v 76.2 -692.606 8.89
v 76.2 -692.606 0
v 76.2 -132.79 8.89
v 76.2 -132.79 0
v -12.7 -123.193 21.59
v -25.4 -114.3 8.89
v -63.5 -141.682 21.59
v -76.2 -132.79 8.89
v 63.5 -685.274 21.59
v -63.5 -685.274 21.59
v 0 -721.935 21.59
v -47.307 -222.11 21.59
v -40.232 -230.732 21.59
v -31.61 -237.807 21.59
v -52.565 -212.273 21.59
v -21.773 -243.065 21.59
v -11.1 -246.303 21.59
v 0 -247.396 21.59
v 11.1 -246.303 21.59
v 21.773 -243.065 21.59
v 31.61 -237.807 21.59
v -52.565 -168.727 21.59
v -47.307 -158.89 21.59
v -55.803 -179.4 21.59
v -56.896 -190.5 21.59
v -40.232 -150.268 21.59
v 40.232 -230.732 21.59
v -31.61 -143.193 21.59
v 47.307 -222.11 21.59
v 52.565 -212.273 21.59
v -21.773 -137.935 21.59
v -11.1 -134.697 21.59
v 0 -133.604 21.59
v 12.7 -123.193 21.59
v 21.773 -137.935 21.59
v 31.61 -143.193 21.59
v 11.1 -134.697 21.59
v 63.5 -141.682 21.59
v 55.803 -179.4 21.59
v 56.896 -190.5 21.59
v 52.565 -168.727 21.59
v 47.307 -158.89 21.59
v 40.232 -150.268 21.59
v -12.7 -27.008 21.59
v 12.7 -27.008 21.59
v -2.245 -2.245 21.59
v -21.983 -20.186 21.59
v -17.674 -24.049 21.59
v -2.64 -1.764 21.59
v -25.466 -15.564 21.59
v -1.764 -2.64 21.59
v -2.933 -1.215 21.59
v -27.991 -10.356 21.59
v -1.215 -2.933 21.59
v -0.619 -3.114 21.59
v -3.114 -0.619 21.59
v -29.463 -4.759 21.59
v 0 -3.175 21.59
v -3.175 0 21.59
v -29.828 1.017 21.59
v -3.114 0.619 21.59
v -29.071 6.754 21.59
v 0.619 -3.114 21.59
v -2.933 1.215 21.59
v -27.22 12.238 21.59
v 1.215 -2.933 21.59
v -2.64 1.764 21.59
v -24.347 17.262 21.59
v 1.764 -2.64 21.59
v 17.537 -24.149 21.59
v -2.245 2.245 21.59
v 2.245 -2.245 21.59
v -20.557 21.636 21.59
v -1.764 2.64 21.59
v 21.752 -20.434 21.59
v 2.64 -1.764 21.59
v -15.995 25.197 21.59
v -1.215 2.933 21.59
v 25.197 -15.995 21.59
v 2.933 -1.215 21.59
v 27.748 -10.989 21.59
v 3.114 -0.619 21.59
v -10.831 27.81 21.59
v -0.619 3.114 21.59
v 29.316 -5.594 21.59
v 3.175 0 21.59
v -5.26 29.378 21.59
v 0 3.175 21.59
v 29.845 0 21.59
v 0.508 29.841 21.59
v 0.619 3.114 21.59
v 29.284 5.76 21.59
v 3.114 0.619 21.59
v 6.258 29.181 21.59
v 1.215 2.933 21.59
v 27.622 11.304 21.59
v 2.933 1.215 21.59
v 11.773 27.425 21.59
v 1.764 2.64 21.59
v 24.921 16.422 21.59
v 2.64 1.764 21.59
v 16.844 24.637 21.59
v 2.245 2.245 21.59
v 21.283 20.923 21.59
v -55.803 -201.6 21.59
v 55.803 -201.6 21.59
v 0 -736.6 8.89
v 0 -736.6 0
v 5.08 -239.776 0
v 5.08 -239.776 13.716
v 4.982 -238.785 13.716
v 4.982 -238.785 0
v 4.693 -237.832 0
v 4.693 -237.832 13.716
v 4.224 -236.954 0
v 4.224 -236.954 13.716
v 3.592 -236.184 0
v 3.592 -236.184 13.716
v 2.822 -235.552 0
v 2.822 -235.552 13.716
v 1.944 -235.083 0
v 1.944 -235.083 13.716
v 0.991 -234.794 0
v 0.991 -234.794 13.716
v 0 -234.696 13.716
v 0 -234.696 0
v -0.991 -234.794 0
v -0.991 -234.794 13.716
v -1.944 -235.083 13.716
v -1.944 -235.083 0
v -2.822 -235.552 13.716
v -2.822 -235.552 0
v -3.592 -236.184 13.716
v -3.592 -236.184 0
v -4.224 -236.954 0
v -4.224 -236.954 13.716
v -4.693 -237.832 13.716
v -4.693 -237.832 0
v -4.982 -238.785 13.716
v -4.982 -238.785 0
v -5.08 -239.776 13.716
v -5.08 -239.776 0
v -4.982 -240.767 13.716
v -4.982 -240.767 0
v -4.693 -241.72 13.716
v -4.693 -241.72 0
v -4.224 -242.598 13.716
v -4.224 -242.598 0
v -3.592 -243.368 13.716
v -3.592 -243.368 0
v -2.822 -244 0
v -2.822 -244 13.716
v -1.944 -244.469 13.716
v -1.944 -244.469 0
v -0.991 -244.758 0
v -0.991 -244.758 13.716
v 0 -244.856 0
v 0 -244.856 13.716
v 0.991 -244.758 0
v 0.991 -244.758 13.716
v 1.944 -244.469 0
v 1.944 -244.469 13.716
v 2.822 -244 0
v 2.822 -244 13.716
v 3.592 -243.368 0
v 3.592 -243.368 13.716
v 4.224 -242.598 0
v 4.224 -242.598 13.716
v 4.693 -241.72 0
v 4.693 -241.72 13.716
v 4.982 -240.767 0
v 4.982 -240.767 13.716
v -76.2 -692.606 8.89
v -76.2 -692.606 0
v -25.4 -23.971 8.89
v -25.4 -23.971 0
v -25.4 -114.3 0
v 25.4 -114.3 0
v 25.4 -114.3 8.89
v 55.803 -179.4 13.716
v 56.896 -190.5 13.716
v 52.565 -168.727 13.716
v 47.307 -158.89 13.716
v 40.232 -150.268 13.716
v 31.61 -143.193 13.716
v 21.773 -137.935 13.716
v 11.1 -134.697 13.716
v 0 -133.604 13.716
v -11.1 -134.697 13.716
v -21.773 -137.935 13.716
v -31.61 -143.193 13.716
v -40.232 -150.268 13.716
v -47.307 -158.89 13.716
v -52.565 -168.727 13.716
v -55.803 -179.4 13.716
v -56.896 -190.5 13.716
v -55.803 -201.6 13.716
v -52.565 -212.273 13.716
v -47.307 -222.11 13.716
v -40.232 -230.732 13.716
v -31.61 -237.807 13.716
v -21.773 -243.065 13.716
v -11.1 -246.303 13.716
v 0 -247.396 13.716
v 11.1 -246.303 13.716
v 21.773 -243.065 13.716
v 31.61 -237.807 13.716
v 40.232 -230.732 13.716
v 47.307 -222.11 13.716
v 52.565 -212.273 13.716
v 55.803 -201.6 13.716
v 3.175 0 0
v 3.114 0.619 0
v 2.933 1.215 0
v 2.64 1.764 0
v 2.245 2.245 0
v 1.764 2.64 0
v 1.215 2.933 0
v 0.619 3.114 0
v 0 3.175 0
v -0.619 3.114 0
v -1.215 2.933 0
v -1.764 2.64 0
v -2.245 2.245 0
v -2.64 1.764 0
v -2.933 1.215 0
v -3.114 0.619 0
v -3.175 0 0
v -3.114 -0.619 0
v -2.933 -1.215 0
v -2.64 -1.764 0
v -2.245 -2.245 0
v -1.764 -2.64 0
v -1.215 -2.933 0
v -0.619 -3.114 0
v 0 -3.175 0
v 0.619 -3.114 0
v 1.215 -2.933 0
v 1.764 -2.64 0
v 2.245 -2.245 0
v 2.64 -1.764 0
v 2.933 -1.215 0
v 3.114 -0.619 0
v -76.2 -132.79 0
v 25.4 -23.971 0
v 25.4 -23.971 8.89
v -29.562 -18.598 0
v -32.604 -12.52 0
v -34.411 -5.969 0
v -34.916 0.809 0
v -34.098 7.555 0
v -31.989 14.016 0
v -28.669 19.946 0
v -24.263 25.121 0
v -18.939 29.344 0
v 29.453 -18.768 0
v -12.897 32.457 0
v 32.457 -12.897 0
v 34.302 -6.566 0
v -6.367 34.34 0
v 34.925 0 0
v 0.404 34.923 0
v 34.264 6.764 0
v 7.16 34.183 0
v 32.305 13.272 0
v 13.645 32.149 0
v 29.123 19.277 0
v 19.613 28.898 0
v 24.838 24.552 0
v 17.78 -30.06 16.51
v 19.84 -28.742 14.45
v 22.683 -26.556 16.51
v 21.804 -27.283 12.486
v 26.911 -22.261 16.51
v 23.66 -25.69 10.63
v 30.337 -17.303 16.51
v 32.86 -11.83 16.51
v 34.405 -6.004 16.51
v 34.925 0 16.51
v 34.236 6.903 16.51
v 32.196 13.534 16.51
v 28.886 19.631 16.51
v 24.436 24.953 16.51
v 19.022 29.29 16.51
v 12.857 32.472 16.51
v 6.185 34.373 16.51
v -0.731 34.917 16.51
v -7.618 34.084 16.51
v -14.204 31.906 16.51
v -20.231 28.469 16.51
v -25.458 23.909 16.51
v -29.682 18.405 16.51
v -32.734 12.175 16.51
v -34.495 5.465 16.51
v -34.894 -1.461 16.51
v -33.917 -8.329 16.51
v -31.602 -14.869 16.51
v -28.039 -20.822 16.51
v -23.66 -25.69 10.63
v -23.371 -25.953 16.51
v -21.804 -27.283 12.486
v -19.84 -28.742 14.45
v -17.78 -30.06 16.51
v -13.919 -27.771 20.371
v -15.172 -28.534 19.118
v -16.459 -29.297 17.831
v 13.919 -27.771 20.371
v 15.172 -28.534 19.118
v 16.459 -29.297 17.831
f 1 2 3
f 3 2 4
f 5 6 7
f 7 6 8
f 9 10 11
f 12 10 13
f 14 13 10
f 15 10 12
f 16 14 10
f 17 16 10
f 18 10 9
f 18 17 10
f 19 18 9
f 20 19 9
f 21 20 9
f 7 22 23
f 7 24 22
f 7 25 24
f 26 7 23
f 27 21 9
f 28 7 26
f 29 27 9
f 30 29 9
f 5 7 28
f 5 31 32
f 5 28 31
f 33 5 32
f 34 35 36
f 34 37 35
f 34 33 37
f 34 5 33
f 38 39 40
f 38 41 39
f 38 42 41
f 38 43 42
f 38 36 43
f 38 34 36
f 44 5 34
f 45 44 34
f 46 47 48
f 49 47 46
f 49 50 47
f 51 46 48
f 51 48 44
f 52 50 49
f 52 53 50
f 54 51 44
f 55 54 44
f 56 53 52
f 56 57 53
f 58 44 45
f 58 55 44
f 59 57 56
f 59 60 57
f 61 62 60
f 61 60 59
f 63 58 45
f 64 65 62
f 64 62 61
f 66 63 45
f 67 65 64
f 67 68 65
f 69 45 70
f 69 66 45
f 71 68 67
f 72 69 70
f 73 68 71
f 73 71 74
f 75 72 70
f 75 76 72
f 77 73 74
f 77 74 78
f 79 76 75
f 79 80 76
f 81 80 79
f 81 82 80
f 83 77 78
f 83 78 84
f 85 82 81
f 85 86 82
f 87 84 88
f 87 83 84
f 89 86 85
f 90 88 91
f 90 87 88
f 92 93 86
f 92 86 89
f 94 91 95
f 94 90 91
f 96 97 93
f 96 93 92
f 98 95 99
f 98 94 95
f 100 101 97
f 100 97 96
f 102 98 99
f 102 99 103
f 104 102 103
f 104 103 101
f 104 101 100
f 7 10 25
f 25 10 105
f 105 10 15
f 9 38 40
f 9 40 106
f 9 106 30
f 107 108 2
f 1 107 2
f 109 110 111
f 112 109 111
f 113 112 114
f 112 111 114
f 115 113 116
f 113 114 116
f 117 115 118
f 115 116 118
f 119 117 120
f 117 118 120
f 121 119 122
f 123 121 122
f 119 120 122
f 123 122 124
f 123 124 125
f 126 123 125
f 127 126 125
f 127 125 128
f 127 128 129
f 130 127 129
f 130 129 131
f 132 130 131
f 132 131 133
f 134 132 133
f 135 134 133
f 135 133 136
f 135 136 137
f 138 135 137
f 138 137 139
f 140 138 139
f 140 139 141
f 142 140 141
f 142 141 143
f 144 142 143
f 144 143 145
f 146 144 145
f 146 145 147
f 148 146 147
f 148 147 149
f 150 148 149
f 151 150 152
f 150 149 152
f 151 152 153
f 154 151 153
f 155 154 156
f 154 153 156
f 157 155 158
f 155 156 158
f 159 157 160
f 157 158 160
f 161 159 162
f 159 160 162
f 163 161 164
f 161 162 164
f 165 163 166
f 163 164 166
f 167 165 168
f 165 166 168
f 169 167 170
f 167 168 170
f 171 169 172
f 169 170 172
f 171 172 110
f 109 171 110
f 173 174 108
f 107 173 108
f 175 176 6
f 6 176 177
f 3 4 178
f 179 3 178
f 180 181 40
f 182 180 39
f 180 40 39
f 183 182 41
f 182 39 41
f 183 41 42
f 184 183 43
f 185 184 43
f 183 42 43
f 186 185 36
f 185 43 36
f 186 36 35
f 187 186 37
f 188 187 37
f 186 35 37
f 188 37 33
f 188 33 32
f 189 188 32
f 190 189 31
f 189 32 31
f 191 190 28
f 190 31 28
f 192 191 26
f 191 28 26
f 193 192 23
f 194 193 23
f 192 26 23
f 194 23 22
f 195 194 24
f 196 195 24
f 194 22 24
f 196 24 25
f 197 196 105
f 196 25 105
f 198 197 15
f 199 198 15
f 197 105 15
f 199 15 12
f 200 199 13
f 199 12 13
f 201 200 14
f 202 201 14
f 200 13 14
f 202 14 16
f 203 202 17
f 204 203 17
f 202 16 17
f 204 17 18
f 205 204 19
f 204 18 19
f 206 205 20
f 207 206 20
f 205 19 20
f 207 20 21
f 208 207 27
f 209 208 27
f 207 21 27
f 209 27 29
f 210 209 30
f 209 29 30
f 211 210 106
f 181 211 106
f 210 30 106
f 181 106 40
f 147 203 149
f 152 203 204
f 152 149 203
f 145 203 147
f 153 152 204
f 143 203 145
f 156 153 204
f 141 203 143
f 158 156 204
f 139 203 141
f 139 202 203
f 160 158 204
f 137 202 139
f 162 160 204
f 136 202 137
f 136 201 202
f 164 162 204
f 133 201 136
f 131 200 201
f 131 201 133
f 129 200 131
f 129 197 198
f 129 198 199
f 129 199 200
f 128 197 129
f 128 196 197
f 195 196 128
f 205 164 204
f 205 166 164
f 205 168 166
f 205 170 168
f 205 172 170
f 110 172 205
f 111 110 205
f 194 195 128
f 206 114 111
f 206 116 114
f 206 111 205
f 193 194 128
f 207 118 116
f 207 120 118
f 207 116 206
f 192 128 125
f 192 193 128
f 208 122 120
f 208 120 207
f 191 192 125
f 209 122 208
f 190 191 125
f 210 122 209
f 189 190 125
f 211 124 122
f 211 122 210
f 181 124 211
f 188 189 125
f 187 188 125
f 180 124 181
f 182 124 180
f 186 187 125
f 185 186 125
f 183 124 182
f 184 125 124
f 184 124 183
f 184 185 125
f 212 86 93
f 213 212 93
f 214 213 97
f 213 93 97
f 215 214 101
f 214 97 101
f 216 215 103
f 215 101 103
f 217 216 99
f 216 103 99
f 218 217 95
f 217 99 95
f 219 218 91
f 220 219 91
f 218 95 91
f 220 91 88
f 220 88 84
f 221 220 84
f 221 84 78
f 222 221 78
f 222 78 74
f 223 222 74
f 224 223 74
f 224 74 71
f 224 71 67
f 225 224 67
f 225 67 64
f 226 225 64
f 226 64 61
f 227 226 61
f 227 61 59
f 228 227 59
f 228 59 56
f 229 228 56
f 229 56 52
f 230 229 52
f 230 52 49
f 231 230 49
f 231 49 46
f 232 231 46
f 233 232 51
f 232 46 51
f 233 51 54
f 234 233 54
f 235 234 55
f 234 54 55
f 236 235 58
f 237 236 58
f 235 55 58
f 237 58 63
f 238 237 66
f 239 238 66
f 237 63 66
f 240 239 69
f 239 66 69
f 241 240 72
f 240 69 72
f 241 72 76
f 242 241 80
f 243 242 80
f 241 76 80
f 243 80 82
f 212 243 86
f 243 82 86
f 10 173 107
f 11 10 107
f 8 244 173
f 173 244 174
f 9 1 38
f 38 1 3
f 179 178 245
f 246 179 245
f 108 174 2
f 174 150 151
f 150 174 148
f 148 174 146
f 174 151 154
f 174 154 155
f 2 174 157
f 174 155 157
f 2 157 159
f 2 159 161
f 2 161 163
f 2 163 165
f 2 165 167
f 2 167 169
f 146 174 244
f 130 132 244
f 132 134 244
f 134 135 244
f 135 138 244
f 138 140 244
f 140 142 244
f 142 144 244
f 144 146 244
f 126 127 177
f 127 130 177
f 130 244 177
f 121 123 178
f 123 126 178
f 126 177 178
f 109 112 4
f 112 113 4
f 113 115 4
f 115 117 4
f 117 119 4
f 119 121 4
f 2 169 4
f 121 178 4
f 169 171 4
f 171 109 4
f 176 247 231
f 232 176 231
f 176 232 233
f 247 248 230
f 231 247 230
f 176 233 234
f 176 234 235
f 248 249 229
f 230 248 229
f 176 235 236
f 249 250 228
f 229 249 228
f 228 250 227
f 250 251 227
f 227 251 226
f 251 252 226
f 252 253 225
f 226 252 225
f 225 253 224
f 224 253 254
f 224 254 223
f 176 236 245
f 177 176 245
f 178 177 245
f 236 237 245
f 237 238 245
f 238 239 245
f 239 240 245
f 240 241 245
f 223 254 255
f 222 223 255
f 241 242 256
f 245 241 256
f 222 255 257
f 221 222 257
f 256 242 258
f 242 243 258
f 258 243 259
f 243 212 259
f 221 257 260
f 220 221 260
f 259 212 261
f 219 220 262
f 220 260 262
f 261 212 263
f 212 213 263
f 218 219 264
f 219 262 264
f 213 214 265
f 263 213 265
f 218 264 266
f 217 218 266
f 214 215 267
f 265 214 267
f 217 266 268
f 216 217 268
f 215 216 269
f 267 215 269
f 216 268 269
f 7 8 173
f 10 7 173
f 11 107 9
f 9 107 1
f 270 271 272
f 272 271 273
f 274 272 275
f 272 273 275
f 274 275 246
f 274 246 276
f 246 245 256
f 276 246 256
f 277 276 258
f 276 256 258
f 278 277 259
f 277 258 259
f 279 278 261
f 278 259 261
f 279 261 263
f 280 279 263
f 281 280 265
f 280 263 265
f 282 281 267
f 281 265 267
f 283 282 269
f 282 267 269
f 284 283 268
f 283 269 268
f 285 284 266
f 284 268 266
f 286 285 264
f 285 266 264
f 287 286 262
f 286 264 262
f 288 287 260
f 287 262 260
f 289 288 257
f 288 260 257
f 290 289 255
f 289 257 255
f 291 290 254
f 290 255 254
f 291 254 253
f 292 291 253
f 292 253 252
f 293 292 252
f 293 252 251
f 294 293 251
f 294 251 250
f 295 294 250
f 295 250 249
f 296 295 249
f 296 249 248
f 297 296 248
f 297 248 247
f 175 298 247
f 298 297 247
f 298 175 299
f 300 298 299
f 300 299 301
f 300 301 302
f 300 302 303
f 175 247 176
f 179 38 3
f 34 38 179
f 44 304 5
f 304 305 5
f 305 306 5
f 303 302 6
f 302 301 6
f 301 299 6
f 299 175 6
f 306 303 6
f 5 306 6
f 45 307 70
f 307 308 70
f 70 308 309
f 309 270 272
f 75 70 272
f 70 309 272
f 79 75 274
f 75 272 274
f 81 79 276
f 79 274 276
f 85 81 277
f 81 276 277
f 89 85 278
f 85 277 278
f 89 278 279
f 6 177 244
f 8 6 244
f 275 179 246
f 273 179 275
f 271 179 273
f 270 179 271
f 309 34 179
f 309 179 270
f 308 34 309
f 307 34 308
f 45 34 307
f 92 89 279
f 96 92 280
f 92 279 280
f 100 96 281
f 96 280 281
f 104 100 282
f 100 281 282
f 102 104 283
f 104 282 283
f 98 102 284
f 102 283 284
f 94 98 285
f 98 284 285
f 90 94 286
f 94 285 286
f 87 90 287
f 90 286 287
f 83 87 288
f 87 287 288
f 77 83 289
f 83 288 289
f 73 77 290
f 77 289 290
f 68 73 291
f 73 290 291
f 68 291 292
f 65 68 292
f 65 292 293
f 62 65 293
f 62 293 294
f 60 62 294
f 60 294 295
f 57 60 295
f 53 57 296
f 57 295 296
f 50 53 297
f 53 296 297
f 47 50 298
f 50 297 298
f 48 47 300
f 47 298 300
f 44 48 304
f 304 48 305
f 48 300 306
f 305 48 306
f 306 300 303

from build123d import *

# Parameters (mm, degrees)
F1_DEPTH = 21.59
F2_R     = 56.896
F3_DEPTH = 7.874
F4_R     = 5.08
F5_DEPTH = 13.717
F6_SIZE  = 12.7
F7_R     = 3.175
F8_DEPTH = 21.591
F9_SIZE  = 5.08


with BuildPart() as f1:
    # F0 (on Top) → F1 (new body)
    with BuildSketch(Plane.XY):
        with BuildLine():
            Line((25.4, -23.970724332), (25.4, 0))
            ThreePointArc((25.4, 0), (0, -25.4), (-25.4, 0))
            Line((-25.4, 0), (-25.4, -23.970724332))
            ThreePointArc((-25.4, -23.970724332), (0, -34.925), (25.4, -23.970724332))
        make_face()
        with BuildLine():
            Line((25.4, -114.3), (25.4, -23.970724332))
            ThreePointArc((25.4, -23.970724332), (0, -34.925), (-25.4, -23.970724332))
            Line((-25.4, -23.970724332), (-25.4, -114.3))
            Line((-25.4, -114.3), (-76.2, -132.7896879007))
            Line((-76.2, -132.7896879007), (-76.2, -692.6059094878))
            Line((-76.2, -692.6059094878), (0, -736.6))
            Line((0, -736.6), (76.2, -692.6059094878))
            Line((76.2, -692.6059094878), (76.2, -132.7896879007))
            Line((76.2, -132.7896879007), (25.4, -114.3))
        make_face()
        with BuildLine():
            ThreePointArc((-25.4, 0), (0, -25.4), (25.4, 0))
            ThreePointArc((25.4, 0), (0, 25.4), (-25.4, 0))
        make_face()
        with BuildLine():
            ThreePointArc((-25.4, 0), (0, 25.4), (25.4, 0))
            Line((25.4, 0), (25.4, -23.970724332))
            ThreePointArc((25.4, -23.970724332), (32.4565141767, -12.8969109674), (34.925, 0))
            ThreePointArc((34.925, 0), (-12.8969109674, 32.4565141767), (-25.4, -23.970724332))
            Line((-25.4, -23.970724332), (-25.4, 0))
        make_face()
    extrude(amount=F1_DEPTH)

    # F2 (on face) → F3 (cut)
    with BuildSketch(Plane.XY.offset(21.59)):
        with Locations((0, -190.5)):
            Circle(F2_R)
    extrude(amount=-F3_DEPTH, mode=Mode.SUBTRACT)

    # F4 (on face) → F5 (cut, through all)
    with BuildSketch(Plane.XY.offset(13.716)):
        with Locations((0, -239.776)):
            Circle(F4_R)
    extrude(amount=-F5_DEPTH, mode=Mode.SUBTRACT)

    # F6
    f6_edges = [f1.edges().sort_by_distance(p)[0] for p in [
        (-76.2, -412.697799, 21.59),
        (-38.1, -714.602955, 21.59),
        (38.1, -714.602955, 21.59),
        (76.2, -412.697799, 21.59),
        (50.8, -123.544844, 21.59),
        (-50.8, -123.544844, 21.59),
        (25.4, -69.135362, 21.59),
        (-25.4, -69.135362, 21.59),
    ]]
    chamfer(f6_edges, length=F6_SIZE)

    # F7 (on face) → F8 (cut, through all)
    with BuildSketch(Plane.XY.offset(21.59)):
        Circle(F7_R)
    extrude(amount=-F8_DEPTH, mode=Mode.SUBTRACT)

    # F9
    f9_edges = [f1.edges().sort_by_distance(p)[0] for p in [
        (0, 34.925, 21.59),
    ]]
    chamfer(f9_edges, length=F9_SIZE)


solid = f1.part
